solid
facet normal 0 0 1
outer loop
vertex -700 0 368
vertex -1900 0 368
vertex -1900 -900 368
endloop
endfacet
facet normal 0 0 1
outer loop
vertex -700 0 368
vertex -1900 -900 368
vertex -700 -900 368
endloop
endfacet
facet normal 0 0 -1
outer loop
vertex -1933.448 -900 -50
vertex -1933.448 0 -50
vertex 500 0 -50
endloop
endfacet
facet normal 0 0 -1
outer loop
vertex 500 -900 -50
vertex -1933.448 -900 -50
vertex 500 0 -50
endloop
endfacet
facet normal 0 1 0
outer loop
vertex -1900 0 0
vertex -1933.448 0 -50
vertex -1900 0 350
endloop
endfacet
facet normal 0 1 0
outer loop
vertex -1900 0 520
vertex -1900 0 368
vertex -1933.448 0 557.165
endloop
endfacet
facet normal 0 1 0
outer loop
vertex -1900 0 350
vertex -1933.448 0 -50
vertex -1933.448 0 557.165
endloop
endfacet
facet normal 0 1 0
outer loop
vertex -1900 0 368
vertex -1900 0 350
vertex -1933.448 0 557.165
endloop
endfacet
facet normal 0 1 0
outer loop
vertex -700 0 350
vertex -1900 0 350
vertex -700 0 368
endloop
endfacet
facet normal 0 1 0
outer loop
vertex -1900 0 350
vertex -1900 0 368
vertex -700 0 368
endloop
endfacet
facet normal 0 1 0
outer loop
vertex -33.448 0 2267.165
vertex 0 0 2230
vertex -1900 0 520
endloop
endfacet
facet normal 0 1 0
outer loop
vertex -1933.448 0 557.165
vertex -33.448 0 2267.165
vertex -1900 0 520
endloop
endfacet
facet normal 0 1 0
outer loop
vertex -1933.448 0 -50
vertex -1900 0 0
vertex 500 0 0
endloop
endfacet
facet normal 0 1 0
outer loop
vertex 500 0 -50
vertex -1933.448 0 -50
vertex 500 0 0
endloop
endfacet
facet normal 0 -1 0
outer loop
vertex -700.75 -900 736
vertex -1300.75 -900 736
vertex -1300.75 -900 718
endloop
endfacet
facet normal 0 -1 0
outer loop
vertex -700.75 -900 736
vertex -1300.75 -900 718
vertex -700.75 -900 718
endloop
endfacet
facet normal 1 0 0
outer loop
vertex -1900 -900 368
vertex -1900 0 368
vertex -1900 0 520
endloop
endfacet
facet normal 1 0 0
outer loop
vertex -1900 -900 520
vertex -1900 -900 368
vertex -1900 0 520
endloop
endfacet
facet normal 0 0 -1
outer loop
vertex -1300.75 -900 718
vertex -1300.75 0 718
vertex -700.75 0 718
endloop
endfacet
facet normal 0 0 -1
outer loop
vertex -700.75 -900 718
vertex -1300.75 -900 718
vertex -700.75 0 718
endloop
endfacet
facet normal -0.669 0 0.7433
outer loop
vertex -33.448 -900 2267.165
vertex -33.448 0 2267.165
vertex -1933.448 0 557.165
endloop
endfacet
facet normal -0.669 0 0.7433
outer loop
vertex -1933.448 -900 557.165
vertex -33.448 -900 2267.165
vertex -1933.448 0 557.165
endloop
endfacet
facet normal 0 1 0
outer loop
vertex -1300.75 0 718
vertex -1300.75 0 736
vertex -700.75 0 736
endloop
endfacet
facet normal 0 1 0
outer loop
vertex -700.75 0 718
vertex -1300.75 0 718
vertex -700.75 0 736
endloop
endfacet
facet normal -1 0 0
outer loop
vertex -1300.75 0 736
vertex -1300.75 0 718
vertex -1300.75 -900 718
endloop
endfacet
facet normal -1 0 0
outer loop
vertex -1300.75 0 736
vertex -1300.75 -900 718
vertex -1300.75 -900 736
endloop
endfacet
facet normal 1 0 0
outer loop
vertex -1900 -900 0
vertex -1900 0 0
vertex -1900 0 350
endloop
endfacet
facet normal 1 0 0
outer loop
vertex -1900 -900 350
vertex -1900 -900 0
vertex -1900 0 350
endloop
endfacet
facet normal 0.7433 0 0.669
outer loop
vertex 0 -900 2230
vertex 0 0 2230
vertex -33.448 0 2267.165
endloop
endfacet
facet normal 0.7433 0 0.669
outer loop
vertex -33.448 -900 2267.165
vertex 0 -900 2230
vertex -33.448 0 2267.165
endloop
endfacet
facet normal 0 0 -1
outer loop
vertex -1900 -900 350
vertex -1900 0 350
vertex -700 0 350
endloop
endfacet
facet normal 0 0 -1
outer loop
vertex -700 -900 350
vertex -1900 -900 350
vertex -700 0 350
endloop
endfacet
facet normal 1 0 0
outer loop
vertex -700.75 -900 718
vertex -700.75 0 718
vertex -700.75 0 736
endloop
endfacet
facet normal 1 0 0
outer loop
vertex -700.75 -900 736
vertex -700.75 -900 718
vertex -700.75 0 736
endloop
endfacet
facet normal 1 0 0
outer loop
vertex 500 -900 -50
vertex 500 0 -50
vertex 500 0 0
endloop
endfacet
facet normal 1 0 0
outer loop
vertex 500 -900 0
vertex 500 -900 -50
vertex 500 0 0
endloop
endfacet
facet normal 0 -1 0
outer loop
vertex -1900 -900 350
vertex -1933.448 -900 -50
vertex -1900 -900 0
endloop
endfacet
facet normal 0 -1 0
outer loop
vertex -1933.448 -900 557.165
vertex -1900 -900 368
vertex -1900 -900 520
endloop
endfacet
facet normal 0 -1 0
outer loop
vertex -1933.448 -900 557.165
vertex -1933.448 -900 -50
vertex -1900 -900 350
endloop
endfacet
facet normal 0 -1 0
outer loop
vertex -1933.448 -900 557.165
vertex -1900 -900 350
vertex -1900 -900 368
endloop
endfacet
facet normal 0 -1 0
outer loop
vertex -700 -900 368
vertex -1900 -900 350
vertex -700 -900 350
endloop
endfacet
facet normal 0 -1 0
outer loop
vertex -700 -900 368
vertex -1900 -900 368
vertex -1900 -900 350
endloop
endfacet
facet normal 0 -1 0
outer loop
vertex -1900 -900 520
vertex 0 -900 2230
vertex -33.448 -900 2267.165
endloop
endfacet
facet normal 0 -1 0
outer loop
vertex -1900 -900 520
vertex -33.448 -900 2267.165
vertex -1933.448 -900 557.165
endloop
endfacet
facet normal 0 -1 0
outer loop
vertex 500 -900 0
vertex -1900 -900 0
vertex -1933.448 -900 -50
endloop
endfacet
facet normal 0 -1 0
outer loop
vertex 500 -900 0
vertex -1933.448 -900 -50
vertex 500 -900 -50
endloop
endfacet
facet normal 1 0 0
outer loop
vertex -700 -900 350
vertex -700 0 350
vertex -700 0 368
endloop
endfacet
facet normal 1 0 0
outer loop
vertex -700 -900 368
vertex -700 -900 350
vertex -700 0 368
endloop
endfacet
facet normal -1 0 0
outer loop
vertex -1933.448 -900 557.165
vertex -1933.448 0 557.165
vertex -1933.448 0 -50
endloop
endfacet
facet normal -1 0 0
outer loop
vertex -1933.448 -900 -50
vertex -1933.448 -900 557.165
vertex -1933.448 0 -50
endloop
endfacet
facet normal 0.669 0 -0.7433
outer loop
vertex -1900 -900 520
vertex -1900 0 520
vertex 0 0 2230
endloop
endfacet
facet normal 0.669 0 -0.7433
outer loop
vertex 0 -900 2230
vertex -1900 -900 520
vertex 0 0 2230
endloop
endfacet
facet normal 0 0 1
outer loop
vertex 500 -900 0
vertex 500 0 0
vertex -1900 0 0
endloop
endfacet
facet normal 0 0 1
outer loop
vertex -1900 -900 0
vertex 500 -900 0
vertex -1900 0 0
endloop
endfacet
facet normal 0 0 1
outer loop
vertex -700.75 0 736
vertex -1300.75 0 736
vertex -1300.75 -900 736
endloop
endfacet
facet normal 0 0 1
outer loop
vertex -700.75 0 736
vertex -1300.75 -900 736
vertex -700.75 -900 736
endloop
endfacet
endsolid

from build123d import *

# Parameters (mm, degrees)
F1_DEPTH = 900
F2_W     = 600
F2_H     = 18
F3_DEPTH = 900
F4_DEPTH = 900
F5_DEPTH = 900


with BuildPart() as f1:
    # F0 (on Front) → F1 (new body)
    with BuildSketch(Plane.XZ):
        Polygon((-1900, 520), (0, 2230), (-33.4482365811, 2267.1647073124), (-1933.4482365811, 557.1647073124), align=None)
        Polygon((-1900, -50), (-1900, 0), (-1900, 520), (-1933.4482365811, 557.1647073124), (-1933.4482365811, -50), align=None)
        Polygon((500, 0), (0, 0), (-1900, 0), (-1900, -50), (500, -50), align=None)
    extrude(amount=F1_DEPTH)

    # F2 (on face) → F3 (join)
    with BuildSketch(Plane.XZ):
        with Locations((-1600, 359)):
            Rectangle(F2_W, F2_H)
    extrude(amount=F3_DEPTH)

    # F2 (on face) → F4 (join)
    with BuildSketch(Plane.XZ):
        with Locations((-1000, 359)):
            Rectangle(F2_W, F2_H)
    extrude(amount=F4_DEPTH)


with BuildPart() as f5:
    # F2 (on face) → F5 (new body)
    with BuildSketch(Plane.XZ):
        with Locations((-1000.7498145103, 727)):
            Rectangle(F2_W, F2_H)
    extrude(amount=F5_DEPTH)


solid = Compound([f1.part, f5.part])
